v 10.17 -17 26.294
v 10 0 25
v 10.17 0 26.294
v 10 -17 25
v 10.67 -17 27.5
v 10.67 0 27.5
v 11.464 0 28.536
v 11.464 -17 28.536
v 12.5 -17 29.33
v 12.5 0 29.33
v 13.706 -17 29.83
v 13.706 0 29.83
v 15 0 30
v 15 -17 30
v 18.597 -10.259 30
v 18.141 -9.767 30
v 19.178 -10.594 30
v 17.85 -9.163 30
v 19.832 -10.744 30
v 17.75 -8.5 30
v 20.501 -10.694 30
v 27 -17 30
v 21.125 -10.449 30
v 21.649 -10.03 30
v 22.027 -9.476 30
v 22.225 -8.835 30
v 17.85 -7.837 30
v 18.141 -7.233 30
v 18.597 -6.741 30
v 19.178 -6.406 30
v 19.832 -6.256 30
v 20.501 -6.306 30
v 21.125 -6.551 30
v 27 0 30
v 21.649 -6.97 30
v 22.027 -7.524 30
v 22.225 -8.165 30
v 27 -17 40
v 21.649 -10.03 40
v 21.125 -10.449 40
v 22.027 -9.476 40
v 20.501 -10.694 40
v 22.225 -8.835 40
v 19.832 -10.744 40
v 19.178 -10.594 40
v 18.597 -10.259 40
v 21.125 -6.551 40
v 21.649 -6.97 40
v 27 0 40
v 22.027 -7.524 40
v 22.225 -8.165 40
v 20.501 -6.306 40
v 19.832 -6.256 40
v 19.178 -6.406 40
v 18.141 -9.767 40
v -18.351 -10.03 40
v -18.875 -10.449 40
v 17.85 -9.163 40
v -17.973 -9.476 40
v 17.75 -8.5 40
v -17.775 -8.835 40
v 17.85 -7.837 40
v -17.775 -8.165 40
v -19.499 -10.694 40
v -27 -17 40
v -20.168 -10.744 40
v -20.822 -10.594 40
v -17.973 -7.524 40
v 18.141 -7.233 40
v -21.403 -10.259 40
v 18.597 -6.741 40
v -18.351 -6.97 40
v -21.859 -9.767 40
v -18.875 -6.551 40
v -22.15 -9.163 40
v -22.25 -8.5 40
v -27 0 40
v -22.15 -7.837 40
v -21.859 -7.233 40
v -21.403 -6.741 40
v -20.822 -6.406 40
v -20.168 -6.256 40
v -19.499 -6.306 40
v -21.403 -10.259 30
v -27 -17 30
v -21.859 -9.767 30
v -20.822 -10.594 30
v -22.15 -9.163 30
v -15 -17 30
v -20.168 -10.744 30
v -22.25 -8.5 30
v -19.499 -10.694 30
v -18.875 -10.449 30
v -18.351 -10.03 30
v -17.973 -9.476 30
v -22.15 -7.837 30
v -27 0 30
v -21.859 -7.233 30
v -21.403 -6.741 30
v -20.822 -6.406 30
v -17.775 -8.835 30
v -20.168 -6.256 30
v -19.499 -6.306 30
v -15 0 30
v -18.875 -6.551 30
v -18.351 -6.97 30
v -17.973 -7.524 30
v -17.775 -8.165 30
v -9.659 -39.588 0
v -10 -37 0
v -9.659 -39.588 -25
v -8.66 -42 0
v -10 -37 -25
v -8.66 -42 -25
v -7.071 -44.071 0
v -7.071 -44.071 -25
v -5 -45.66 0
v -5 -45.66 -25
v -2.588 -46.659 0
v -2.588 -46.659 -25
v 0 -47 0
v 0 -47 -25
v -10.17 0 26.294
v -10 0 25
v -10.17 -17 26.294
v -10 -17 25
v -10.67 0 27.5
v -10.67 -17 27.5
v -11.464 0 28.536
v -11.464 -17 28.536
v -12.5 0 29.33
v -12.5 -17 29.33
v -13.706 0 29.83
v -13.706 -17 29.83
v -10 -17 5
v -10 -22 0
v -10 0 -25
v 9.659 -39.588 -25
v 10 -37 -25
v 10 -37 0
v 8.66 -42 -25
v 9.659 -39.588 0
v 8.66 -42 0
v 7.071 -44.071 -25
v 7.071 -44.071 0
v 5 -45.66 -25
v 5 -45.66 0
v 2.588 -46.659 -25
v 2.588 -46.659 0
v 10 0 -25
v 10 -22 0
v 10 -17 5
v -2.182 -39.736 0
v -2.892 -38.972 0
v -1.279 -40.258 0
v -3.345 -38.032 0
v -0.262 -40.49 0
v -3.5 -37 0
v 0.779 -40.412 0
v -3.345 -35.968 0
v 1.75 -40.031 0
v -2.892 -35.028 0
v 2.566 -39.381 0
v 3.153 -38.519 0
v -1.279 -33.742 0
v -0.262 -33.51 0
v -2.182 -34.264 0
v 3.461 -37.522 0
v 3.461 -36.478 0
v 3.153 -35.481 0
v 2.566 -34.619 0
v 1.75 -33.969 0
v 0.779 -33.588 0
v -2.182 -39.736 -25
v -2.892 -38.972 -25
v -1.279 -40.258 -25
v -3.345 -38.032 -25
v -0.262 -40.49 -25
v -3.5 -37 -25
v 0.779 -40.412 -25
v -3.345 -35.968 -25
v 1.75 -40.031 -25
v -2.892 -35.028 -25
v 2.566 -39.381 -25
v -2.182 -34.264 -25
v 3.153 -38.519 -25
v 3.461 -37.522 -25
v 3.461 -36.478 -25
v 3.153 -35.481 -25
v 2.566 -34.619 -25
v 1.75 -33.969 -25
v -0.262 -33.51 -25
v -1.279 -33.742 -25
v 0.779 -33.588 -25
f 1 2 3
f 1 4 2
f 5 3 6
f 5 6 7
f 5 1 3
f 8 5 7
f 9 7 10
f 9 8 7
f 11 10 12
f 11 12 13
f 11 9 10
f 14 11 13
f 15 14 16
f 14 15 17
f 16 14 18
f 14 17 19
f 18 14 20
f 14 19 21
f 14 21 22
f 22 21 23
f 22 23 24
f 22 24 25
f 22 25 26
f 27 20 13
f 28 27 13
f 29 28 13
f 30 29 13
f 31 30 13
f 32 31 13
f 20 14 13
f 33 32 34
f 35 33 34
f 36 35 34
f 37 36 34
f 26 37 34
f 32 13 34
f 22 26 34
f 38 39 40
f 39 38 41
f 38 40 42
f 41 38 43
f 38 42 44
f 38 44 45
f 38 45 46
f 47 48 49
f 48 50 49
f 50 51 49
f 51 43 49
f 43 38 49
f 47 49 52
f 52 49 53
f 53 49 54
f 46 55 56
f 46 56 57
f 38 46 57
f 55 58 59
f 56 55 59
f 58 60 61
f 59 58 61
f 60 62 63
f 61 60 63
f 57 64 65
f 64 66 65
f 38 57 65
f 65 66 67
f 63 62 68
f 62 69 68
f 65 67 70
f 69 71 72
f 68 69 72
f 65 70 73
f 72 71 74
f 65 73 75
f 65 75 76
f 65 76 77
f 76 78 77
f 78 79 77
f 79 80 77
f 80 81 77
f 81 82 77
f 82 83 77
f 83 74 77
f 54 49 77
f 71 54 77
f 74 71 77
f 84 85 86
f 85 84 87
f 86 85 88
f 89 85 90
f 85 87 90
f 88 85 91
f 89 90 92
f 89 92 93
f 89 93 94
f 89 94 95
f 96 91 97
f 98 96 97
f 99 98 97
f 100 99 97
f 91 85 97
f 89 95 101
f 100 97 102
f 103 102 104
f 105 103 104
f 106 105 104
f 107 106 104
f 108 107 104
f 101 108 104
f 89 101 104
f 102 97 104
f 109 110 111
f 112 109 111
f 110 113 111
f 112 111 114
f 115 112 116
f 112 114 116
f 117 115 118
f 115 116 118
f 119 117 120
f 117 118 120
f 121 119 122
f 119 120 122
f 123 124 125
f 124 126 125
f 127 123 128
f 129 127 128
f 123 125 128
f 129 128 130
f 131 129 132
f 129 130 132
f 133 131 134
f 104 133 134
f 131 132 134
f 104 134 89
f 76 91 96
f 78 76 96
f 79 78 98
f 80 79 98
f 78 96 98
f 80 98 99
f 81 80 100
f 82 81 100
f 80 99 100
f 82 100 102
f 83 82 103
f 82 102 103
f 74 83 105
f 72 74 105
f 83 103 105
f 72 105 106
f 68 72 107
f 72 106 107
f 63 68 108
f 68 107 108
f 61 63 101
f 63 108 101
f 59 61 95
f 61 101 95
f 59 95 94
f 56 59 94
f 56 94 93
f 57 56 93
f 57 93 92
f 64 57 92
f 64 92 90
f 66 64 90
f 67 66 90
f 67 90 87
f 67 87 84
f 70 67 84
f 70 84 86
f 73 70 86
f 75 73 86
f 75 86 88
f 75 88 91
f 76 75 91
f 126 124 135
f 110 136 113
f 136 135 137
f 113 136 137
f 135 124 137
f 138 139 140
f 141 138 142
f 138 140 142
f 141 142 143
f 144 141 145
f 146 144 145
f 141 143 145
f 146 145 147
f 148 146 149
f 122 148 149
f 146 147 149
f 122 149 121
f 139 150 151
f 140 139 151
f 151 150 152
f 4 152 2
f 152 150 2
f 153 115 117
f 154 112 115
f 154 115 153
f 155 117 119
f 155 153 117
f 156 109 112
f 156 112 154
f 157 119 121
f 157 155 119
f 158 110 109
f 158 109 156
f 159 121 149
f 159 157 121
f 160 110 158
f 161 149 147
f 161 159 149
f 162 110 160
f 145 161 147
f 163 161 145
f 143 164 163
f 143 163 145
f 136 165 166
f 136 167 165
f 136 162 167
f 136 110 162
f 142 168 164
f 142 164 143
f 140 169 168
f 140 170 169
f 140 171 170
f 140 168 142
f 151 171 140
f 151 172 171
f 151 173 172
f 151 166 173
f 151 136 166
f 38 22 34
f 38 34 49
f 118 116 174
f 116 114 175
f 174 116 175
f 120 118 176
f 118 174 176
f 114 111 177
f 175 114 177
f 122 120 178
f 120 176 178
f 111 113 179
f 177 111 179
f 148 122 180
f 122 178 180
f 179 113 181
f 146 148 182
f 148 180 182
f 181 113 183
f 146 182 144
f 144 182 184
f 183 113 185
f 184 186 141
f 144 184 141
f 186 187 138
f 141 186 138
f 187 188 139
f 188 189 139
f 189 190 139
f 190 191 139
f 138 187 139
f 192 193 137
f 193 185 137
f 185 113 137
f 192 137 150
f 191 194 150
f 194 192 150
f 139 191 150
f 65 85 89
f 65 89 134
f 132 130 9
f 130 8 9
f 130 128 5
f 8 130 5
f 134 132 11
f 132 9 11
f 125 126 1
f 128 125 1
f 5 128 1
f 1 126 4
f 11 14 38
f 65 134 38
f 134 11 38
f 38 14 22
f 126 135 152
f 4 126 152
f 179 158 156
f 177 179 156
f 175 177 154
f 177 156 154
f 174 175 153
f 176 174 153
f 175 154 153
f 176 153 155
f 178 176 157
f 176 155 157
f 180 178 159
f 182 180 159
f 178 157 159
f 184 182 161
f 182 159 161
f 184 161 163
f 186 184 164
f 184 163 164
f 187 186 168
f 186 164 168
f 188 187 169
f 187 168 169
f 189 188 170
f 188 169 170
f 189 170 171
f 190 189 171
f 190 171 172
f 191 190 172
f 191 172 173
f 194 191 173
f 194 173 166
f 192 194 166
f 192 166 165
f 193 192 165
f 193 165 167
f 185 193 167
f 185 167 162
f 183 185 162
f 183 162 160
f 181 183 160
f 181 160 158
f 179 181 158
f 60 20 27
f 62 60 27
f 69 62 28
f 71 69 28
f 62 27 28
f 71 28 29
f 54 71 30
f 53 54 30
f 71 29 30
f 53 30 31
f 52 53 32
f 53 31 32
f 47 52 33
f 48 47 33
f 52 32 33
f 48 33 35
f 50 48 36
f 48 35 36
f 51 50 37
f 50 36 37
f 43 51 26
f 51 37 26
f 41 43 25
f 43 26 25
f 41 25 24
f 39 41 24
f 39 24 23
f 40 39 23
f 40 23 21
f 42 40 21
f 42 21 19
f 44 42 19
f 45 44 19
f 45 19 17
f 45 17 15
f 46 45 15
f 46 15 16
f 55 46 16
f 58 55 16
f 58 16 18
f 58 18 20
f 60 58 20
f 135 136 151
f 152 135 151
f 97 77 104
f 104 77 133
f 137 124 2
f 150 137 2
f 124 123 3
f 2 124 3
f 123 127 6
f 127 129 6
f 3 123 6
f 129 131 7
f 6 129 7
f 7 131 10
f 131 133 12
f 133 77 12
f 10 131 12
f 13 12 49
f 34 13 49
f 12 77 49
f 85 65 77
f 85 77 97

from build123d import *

# Parameters (mm, degrees)
F1_DEPTH = 47
F3_D     = 7
F4_W     = 54
F4_H     = 30
F5_DEPTH = 40.001
F6_R     = 9.99999
F8_R     = 5
F10_D    = 4.5
F11_SIZE = 5


# Not quite as in the source:
# - a fillet or chamfer is up to 0.001 mm smaller than in the source, because OpenCascade refuses the exact size


with BuildPart() as f1:
    # F0 (on Front) → F1 (new body)
    with BuildSketch(Plane.XZ):
        Polygon((27, 40), (-27, 40), (-27, 30), (-10, 30), (-10, -25), (10, -25), (10, 30), (27, 30), align=None)
    extrude(amount=F1_DEPTH)

    # F3 (through all)
    with Locations(Plane(origin=(0, 0, -25), x_dir=(1, 0, 0), z_dir=(0, 0, -1))):
        with Locations((0, 37)):
            Hole(F3_D / 2)

    # F4 (on Top) → F5 (cut, through all)
    with BuildSketch(Plane.XY):
        with Locations((0, -32)):
            Rectangle(F4_W, F4_H)
    extrude(amount=F5_DEPTH, mode=Mode.SUBTRACT)

    # F6 (radius 10 in the source; OpenCascade refuses exactly that, so slightly less here)
    f6_edges = [f1.edges().sort_by_distance(p)[0] for p in [
        (-10, -47, -12.5),
        (10, -47, -12.5),
    ]]
    fillet(f6_edges, radius=F6_R)

    # F8
    f8_edges = [f1.edges().sort_by_distance(p)[0] for p in [
        (10, -8.5, 30),
        (-10, -8.5, 30),
    ]]
    fillet(f8_edges, radius=F8_R)

    # F10 (through all)
    with Locations(Plane.XY.offset(40)):
        with Locations((-20, -8.5), (20, -8.5)):
            Hole(F10_D / 2)

    # F11
    f11_edges = [f1.edges().sort_by_distance(p)[0] for p in [
        (0, -17, 0),
    ]]
    chamfer(f11_edges, length=F11_SIZE)


solid = f1.part
